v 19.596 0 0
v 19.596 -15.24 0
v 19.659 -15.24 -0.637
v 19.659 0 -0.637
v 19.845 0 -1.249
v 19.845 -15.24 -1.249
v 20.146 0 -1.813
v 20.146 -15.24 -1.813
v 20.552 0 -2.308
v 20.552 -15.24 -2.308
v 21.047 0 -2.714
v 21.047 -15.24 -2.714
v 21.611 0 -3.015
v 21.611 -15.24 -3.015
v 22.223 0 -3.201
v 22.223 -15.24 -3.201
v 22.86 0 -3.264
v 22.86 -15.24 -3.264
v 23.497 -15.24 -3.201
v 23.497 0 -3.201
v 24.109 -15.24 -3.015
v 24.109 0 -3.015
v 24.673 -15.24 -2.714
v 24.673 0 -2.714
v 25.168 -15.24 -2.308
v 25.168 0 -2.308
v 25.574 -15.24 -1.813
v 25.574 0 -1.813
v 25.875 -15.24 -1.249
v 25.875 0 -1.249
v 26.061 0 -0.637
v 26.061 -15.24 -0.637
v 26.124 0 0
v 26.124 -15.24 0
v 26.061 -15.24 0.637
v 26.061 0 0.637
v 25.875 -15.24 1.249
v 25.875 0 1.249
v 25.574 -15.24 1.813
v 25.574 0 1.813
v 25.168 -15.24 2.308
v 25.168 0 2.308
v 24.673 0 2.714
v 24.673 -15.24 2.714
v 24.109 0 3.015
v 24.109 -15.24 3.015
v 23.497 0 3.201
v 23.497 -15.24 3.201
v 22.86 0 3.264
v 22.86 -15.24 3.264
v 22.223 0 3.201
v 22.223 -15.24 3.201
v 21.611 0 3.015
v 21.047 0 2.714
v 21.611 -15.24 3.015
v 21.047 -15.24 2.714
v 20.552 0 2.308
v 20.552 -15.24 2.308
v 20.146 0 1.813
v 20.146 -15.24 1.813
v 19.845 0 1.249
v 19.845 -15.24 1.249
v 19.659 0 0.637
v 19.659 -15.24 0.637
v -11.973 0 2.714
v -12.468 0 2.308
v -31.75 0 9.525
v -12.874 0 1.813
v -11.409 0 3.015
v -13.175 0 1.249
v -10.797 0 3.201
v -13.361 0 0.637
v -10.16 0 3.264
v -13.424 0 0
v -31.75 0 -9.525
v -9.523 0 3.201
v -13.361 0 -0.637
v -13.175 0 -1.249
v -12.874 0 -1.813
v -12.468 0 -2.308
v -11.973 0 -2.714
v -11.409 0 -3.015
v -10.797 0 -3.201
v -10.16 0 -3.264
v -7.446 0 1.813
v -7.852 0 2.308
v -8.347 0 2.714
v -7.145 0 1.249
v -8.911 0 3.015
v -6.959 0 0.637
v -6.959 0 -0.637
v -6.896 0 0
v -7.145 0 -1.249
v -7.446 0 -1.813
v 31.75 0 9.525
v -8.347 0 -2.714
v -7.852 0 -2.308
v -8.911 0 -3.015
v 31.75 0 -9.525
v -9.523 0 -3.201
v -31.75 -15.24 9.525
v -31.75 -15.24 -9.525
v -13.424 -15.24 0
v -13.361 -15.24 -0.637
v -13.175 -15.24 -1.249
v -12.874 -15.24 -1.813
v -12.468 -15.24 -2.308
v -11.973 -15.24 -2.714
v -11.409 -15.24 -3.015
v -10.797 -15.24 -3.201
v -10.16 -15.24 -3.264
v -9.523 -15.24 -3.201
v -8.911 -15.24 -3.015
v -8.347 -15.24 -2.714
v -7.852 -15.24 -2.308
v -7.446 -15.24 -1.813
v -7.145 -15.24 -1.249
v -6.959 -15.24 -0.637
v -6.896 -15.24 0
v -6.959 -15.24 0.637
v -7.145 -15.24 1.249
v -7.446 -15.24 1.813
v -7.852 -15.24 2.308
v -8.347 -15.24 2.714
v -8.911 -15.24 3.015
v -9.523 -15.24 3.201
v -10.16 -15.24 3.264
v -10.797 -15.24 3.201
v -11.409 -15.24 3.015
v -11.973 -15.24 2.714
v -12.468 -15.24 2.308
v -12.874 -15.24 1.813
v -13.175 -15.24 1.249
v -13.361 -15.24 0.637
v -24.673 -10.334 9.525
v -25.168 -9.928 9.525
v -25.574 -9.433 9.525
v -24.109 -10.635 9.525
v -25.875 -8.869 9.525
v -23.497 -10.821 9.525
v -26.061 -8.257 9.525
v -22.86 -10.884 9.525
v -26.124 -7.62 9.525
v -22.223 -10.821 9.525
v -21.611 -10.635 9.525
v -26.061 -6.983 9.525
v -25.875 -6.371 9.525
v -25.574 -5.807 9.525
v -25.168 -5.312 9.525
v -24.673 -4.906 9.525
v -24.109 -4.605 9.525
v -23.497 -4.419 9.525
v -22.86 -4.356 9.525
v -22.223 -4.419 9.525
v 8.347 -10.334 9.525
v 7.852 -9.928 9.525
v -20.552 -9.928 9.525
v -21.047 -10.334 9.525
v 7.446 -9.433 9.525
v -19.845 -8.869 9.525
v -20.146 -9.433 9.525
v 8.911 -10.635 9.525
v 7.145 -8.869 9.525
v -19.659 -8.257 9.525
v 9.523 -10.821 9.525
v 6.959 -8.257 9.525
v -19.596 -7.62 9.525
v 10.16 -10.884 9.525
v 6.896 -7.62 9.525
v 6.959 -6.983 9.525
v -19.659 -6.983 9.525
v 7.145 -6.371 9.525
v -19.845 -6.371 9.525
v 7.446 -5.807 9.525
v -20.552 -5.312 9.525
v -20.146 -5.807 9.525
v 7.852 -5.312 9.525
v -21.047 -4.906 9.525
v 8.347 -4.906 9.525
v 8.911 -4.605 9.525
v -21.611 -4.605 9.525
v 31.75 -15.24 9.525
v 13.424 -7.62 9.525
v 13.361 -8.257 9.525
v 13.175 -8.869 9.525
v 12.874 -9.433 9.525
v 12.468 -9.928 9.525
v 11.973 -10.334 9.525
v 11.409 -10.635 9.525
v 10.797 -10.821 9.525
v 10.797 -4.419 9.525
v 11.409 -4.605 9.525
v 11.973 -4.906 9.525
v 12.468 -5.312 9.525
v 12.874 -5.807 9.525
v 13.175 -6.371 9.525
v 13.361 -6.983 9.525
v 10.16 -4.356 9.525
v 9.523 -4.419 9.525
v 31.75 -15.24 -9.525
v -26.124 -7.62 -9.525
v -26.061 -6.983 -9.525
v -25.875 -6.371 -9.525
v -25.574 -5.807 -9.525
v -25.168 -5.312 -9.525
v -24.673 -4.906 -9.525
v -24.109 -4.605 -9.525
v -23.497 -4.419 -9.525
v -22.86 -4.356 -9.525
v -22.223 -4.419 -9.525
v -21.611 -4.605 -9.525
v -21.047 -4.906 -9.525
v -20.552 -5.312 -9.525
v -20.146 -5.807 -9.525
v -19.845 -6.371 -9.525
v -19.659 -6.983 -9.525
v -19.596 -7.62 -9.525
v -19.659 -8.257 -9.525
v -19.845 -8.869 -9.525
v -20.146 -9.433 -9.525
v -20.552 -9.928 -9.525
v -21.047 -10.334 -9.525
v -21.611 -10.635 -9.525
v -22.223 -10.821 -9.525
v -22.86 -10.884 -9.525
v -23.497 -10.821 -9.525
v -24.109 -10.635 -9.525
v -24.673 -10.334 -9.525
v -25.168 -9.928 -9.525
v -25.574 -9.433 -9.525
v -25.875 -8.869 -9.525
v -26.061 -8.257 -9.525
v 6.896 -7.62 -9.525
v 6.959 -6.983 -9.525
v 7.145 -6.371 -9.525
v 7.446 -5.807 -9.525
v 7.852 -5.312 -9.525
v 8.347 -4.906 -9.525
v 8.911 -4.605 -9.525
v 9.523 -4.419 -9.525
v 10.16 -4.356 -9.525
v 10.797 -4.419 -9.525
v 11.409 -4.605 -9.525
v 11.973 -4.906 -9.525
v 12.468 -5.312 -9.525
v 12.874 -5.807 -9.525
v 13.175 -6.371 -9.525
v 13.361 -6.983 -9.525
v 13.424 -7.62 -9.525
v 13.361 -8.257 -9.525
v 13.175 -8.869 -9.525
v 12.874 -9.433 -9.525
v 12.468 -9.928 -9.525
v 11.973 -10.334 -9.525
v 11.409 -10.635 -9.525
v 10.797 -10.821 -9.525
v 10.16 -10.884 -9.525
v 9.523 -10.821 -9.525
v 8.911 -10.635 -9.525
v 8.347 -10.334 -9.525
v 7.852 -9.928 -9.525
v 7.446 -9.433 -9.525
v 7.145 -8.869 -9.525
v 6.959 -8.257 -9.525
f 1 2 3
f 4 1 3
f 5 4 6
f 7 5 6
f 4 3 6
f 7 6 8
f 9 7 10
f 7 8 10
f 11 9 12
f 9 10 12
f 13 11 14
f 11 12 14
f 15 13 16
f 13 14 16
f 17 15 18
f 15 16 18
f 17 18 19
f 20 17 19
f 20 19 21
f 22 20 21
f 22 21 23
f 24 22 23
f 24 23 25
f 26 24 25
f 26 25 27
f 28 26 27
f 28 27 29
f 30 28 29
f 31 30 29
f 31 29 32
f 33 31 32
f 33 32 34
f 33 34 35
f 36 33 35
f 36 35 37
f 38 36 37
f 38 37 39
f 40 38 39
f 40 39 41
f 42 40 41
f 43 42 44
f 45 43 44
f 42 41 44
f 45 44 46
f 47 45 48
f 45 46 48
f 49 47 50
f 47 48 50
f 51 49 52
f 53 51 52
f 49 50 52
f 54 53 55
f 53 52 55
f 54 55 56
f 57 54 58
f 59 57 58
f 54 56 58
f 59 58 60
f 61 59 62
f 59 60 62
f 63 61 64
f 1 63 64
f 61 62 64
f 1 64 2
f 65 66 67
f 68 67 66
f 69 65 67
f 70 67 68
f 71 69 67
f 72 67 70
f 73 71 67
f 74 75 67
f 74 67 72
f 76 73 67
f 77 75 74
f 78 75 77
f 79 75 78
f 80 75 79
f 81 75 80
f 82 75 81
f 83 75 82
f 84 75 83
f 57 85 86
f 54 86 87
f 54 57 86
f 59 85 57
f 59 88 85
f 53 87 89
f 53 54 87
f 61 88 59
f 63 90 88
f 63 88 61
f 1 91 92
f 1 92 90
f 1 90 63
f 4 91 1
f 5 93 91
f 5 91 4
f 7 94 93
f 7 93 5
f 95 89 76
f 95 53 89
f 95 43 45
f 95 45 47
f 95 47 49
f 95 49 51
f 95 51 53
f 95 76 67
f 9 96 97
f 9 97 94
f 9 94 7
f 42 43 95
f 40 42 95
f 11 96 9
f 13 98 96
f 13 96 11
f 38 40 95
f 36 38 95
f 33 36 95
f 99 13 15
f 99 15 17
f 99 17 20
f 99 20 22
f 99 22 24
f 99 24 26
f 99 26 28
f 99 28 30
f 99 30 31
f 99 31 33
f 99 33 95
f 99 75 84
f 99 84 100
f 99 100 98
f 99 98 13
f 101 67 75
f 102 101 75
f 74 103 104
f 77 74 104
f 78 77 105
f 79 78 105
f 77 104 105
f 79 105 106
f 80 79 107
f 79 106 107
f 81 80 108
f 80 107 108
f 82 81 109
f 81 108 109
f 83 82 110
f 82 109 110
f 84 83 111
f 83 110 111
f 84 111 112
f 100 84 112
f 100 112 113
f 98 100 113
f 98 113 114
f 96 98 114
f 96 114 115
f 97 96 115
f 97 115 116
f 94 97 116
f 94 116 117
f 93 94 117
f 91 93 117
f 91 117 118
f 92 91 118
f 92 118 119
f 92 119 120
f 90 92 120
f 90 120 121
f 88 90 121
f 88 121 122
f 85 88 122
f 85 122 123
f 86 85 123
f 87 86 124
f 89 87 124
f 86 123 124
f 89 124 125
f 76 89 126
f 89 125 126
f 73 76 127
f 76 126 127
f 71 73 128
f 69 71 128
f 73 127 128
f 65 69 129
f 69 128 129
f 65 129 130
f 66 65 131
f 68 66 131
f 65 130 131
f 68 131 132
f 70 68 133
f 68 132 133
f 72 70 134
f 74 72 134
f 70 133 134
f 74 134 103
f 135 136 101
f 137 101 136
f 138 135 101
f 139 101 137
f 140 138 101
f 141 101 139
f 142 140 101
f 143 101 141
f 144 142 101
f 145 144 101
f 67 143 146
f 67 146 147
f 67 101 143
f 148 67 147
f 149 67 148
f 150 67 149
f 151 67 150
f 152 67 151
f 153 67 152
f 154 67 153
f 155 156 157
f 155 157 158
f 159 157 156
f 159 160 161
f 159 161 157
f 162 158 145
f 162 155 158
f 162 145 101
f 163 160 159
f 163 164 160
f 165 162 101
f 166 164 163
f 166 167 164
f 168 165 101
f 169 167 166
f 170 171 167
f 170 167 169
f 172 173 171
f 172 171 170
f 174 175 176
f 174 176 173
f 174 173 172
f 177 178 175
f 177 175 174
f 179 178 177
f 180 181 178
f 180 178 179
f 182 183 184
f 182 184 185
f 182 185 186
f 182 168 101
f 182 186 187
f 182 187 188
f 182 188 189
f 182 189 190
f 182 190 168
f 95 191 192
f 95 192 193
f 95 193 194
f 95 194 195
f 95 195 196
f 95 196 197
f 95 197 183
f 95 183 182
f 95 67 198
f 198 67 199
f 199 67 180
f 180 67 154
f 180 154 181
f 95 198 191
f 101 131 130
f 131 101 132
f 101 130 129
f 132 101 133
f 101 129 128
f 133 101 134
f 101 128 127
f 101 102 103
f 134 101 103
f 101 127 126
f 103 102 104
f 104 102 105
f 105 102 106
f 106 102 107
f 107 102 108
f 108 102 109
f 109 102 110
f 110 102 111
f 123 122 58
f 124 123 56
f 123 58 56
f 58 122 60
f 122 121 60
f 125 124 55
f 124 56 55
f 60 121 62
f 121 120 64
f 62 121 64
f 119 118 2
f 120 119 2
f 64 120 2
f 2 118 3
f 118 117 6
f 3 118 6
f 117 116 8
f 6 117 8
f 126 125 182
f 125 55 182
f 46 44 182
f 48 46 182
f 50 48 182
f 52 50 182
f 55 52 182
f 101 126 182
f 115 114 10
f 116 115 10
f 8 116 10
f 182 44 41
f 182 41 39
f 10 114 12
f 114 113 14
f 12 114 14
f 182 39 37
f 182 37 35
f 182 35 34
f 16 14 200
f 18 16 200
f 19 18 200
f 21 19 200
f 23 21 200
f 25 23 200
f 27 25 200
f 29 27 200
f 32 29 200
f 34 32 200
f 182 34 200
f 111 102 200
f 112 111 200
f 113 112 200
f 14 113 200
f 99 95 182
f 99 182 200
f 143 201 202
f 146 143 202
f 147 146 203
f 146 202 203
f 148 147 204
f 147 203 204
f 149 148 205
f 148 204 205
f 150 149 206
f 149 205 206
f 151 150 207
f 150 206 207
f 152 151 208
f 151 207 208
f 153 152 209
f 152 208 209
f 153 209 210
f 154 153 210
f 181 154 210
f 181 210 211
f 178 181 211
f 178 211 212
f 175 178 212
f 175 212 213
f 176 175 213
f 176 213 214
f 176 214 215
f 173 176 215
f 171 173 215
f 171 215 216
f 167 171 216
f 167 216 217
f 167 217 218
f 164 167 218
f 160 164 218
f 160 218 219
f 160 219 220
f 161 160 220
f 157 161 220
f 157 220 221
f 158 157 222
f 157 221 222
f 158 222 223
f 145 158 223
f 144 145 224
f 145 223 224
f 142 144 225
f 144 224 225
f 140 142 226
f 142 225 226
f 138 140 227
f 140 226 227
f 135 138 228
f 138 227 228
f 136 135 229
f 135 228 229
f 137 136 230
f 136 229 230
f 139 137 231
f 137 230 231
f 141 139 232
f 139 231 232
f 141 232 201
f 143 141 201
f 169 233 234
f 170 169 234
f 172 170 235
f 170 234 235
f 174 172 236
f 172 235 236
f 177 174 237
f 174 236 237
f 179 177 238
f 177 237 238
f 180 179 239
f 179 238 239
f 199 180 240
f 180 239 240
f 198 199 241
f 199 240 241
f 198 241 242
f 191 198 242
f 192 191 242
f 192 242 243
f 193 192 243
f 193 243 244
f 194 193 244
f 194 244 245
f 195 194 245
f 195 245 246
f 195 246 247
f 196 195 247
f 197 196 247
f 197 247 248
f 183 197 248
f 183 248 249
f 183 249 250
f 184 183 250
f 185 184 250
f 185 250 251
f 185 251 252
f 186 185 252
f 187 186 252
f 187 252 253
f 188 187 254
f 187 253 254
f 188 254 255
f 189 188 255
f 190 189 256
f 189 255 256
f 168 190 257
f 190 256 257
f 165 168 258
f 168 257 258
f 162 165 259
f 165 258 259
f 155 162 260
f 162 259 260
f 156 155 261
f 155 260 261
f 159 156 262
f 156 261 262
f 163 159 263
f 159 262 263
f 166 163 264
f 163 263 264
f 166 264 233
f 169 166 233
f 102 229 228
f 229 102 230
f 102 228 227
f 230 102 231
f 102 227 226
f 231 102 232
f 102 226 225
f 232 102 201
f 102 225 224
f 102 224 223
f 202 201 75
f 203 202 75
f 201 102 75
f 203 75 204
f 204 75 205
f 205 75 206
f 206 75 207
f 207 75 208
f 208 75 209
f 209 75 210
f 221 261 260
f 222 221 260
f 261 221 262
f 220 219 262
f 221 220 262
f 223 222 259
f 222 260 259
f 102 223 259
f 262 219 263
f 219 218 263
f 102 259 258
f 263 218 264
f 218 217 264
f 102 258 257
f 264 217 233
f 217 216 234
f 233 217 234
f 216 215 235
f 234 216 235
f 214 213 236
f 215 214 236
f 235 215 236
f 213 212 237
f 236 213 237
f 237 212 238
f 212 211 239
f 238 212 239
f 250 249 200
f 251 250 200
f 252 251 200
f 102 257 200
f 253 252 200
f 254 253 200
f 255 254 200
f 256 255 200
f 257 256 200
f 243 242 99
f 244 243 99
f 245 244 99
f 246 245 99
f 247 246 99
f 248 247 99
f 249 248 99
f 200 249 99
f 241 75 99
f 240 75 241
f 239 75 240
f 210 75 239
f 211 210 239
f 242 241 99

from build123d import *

# Parameters (mm, degrees)
SKETCH2_W               = 63.5
SKETCH2_H               = 19.05
BOSS_EXTRUDE1_DEPTH     = 15.24
F_1_4_CLEARANCE_HOLE2_D = 6.5278
F_1_4_CLEARANCE_HOLE3_D = 6.5278


with BuildPart() as part:
    # Sketch2 → Boss-Extrude1 (new body)
    with BuildSketch(Plane(origin=(0, 0, 0), x_dir=(1, 0, 0), z_dir=(0, 1, 0))):
        Rectangle(SKETCH2_W, SKETCH2_H)
    extrude(amount=-BOSS_EXTRUDE1_DEPTH)

    # 1/4 Clearance Hole2 (through all)
    with Locations(Plane.XY.offset(9.525)):
        with Locations((-22.86, -7.62), (10.16, -7.62)):
            Hole(F_1_4_CLEARANCE_HOLE2_D / 2)

    # 1/4 Clearance Hole3 (through all)
    with Locations(Plane(origin=(0, 0, 0), x_dir=(1, 0, 0), z_dir=(0, 1, 0))):
        with Locations((-10.16, 0), (22.86, 0)):
            Hole(F_1_4_CLEARANCE_HOLE3_D / 2)


solid = part.part
